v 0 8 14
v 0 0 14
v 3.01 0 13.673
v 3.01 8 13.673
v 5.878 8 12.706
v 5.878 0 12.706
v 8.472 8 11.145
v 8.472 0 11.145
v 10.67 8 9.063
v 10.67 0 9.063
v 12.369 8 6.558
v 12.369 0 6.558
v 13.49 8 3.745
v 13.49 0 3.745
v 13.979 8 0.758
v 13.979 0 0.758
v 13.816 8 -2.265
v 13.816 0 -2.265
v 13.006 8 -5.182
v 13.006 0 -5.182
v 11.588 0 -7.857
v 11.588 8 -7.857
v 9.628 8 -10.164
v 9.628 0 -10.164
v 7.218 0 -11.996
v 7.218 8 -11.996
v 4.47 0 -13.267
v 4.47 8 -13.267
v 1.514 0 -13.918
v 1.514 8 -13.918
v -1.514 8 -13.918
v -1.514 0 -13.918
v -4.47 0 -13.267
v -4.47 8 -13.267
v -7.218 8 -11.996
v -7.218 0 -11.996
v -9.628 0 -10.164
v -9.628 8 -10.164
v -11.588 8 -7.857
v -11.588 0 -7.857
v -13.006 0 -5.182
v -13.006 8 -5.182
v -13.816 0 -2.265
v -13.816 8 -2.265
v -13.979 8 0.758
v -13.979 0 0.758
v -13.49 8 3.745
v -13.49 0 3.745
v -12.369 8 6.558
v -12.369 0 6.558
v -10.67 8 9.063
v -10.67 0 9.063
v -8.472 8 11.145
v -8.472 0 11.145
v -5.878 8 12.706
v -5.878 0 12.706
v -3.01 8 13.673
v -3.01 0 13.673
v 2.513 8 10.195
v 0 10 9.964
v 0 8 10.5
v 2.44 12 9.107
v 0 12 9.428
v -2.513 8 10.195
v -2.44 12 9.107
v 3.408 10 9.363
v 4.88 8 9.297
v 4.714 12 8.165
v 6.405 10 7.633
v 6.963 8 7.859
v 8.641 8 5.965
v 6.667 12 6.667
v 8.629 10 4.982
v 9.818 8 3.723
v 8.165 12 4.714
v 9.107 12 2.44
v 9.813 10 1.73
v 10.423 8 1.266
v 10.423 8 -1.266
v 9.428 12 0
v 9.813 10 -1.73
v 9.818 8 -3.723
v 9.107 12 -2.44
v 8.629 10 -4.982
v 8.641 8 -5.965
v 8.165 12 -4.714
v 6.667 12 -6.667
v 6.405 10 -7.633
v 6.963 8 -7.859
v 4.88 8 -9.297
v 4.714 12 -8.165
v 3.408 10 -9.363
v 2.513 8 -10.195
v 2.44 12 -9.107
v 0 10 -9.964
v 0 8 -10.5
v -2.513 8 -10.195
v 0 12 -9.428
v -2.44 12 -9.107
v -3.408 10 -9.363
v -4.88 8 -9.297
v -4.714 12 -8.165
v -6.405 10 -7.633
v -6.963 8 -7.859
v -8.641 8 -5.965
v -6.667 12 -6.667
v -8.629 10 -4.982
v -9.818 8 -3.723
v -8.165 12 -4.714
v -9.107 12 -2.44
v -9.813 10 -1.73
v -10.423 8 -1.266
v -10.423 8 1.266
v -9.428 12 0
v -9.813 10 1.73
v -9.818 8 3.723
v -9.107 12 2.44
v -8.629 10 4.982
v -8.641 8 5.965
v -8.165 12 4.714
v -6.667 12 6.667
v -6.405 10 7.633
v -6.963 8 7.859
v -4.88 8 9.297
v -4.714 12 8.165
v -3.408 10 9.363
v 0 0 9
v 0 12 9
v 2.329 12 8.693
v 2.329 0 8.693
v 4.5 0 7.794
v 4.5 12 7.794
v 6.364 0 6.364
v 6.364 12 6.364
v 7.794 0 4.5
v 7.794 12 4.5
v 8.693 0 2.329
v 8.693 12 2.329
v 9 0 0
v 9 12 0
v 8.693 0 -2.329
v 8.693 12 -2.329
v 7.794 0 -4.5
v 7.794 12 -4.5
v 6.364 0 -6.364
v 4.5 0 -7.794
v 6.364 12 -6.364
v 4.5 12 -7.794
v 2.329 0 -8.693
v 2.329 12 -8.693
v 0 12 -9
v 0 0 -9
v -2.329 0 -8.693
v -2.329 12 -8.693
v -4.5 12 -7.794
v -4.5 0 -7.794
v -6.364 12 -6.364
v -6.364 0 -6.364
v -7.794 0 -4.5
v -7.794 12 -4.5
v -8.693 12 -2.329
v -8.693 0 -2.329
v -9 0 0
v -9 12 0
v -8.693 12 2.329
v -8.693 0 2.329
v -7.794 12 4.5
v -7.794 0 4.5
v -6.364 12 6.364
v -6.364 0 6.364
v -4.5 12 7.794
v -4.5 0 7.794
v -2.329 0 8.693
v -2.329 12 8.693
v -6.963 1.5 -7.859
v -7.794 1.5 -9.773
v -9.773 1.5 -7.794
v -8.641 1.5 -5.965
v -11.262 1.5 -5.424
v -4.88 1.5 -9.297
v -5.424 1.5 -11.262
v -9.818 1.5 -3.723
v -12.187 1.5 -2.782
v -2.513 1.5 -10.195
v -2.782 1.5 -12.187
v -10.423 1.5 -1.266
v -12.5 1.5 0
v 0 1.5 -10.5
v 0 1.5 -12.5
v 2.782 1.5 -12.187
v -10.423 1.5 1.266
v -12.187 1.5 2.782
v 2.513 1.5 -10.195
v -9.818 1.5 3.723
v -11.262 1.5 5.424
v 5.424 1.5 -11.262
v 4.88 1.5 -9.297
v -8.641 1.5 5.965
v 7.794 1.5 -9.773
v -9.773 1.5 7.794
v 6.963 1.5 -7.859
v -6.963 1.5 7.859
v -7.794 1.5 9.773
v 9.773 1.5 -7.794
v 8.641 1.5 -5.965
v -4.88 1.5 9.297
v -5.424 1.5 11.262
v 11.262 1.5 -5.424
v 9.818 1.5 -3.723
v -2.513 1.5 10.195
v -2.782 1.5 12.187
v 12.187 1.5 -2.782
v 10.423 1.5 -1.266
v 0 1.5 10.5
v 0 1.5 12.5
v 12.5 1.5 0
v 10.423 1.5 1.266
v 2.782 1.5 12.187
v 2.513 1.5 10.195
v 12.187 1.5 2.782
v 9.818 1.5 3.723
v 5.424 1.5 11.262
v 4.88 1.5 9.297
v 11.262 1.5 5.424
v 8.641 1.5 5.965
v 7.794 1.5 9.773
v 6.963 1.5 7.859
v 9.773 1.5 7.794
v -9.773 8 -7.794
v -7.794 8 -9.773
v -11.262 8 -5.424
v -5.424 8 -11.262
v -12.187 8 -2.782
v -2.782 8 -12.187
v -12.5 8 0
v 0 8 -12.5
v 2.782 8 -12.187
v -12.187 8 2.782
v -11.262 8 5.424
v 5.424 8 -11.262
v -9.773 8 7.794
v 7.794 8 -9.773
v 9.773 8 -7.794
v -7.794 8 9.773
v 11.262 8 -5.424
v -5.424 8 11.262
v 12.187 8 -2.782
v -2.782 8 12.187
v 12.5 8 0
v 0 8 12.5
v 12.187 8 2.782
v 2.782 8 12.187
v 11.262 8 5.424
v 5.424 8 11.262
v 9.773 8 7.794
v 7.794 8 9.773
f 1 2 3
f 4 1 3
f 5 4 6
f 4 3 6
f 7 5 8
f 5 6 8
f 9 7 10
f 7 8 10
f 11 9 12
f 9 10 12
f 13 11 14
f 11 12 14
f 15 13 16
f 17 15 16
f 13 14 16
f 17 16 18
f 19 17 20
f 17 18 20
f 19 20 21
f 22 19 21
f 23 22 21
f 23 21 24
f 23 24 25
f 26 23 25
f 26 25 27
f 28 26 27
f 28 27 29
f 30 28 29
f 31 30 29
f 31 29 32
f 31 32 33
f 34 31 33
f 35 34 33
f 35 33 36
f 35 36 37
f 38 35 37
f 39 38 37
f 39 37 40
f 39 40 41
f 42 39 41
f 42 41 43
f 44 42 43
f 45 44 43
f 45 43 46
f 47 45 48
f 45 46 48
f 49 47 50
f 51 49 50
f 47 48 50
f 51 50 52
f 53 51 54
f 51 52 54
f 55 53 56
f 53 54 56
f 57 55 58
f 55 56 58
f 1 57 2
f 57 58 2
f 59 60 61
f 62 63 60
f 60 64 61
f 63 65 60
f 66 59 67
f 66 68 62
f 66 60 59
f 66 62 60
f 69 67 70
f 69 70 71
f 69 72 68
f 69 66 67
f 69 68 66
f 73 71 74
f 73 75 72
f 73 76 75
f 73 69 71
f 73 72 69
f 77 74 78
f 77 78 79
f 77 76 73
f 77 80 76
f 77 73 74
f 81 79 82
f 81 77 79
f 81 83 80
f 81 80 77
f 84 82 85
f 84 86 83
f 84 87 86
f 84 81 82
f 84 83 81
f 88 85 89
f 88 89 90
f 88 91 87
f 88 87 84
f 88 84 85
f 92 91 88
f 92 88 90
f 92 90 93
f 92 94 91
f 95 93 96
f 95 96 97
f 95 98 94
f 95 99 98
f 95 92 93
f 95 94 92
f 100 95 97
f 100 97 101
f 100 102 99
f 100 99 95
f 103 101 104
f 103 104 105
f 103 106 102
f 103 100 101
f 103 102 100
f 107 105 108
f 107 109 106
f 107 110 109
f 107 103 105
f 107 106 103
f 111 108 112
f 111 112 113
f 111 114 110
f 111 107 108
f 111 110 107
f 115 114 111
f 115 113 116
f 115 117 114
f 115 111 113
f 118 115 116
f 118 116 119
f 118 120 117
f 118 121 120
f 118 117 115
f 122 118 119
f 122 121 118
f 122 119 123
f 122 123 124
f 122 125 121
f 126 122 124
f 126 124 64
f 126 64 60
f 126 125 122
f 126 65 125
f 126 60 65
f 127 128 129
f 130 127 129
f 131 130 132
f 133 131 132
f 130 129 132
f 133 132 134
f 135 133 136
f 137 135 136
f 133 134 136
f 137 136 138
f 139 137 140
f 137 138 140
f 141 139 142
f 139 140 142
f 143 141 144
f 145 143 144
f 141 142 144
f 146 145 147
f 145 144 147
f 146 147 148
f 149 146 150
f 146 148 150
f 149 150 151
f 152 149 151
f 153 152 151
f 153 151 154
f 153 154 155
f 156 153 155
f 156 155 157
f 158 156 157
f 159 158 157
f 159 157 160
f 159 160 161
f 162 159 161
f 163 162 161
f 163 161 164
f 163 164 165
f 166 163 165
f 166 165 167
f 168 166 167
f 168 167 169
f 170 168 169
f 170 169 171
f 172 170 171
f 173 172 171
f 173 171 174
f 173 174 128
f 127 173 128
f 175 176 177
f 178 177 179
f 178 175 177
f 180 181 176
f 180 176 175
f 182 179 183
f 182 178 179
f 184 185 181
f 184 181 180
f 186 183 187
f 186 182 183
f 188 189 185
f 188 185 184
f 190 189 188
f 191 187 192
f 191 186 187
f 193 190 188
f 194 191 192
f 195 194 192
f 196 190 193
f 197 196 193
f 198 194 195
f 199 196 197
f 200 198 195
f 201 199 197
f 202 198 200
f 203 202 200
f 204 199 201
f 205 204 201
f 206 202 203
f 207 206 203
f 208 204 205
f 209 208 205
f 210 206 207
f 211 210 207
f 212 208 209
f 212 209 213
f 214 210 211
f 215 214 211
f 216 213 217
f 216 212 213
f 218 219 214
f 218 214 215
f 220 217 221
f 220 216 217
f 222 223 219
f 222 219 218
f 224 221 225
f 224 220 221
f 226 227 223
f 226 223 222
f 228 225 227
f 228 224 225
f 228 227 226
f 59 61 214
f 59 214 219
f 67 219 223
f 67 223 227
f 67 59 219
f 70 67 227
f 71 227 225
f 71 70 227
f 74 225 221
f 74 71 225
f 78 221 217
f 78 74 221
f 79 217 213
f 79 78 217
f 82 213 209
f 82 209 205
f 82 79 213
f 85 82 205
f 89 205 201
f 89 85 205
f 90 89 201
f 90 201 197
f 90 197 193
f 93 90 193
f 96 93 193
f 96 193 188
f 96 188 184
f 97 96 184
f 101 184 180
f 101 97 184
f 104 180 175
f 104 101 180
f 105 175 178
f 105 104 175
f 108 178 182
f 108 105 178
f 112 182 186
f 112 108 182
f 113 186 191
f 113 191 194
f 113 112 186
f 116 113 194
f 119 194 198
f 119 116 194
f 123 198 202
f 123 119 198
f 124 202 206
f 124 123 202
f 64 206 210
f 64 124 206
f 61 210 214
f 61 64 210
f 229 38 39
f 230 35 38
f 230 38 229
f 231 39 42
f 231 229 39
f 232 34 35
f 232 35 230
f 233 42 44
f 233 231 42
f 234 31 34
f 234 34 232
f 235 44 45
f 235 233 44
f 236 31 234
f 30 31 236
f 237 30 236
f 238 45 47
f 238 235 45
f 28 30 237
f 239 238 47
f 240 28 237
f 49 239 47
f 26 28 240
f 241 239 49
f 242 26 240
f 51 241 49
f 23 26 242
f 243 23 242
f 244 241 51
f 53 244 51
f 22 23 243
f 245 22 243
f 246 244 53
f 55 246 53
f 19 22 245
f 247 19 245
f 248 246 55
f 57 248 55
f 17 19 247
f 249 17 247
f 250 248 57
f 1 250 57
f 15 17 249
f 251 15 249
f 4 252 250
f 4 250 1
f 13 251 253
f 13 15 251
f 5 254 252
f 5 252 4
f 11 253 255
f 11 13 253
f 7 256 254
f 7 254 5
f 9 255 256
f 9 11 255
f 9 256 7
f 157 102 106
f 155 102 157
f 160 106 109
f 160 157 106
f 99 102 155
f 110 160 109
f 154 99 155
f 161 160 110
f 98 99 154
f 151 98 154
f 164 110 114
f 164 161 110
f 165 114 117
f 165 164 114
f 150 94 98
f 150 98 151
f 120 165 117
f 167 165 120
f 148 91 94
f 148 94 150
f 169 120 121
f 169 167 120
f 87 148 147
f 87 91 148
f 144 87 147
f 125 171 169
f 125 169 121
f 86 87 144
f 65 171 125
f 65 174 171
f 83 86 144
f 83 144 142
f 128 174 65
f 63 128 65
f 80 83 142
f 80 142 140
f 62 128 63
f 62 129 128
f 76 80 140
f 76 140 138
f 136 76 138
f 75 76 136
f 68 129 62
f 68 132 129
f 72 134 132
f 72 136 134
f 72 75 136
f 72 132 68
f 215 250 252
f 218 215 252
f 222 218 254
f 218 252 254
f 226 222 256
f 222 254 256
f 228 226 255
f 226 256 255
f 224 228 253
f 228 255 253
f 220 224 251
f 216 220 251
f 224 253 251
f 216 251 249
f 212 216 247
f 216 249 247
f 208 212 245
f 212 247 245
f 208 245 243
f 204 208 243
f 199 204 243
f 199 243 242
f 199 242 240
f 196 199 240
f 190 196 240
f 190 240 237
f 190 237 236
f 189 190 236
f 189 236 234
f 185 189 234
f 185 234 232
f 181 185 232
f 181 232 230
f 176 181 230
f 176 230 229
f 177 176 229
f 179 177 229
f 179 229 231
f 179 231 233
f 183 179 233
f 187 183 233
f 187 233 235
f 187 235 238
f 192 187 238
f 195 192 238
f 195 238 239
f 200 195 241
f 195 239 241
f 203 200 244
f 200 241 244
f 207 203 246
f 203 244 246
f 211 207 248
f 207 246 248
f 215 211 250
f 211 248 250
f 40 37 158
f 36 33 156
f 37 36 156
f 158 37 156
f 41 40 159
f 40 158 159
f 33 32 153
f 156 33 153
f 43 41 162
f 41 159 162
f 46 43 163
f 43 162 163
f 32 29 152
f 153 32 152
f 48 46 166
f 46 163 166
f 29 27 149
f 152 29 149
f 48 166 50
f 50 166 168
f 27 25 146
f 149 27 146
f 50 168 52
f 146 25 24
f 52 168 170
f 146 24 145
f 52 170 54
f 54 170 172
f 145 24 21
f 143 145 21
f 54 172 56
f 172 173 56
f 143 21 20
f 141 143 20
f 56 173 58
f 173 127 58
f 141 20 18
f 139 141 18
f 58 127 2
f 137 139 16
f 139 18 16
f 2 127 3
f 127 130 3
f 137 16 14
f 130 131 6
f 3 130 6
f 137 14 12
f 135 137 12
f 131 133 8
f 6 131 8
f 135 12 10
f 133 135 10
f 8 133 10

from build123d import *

# Parameters (mm, degrees)
SKETCH1_R           = 14
BOSS_EXTRUDE1_DEPTH = 12
CUT_EXTRUDE1_REACH  = 25.152
SKETCH2_R           = 9
SKETCH3_R           = 12.5
SKETCH3_R_2         = 10.5
CUT_EXTRUDE2_DEPTH  = 10.5
SKETCH4_R           = 14
SKETCH4_R_2         = 12.5
CUT_EXTRUDE3_DEPTH  = 4
CHAMFER1_SIZE       = 4
CHAMFER1_SIZE2      = 1.07179677


with BuildPart() as part:
    # Sketch1 → Boss-Extrude1 (new body)
    with BuildSketch(Plane(origin=(0, 0, 0), x_dir=(1, 0, 0), z_dir=(0, 1, 0))):
        with Locations(Location((0, 0, 0), (0, 0, 270))):
            Circle(SKETCH1_R)
    extrude(amount=BOSS_EXTRUDE1_DEPTH)

    # Sketch2 → Cut-Extrude1 (cut, up to next)
    with BuildSketch(Plane(origin=(0, 12, 0), x_dir=(1, 0, 0), z_dir=(0, 1, 0)), mode=Mode.PRIVATE) as cut_extrude1_sk1:
        with Locations(Location((0, 0, 0), (0, 0, 270))):
            Circle(SKETCH2_R)
    cut_extrude1_tool1 = extrude(cut_extrude1_sk1.sketch, amount=-CUT_EXTRUDE1_REACH, mode=Mode.PRIVATE) & part.part
    add(cut_extrude1_tool1.solids().sort_by_distance((0, 12, 0))[0], mode=Mode.SUBTRACT)

    # Sketch3 → Cut-Extrude2 (cut)
    with BuildSketch(Plane(origin=(0, 12, 0), x_dir=(1, 0, 0), z_dir=(0, 1, 0))):
        with Locations(Location((0, 0, 0), (0, 0, 270))):
            Circle(SKETCH3_R)
        with Locations(Location((0, 0, 0), (0, 0, 270))):
            Circle(SKETCH3_R_2, mode=Mode.SUBTRACT)
    extrude(amount=-CUT_EXTRUDE2_DEPTH, mode=Mode.SUBTRACT)

    # Sketch4 → Cut-Extrude3 (cut)
    with BuildSketch(Plane(origin=(0, 12, 0), x_dir=(1, 0, 0), z_dir=(0, 1, 0))):
        with Locations(Location((0, 0, 0), (0, 0, 270))):
            Circle(SKETCH4_R)
        with Locations(Location((0, 0, 0), (0, 0, 270))):
            Circle(SKETCH4_R_2, mode=Mode.SUBTRACT)
    extrude(amount=-CUT_EXTRUDE3_DEPTH, mode=Mode.SUBTRACT)

    # Chamfer1
    chamfer1_edges = [part.edges().sort_by_distance(p)[0] for p in [
        (0, 12, -10.5),
    ]]
    chamfer1_side = [part.faces().sort_by_distance(p)[0] for p in [
        (0, 6.75, -10.5),
    ]]
    chamfer(chamfer1_edges, length=CHAMFER1_SIZE, length2=CHAMFER1_SIZE2, reference=chamfer1_side[0])


solid = part.part
